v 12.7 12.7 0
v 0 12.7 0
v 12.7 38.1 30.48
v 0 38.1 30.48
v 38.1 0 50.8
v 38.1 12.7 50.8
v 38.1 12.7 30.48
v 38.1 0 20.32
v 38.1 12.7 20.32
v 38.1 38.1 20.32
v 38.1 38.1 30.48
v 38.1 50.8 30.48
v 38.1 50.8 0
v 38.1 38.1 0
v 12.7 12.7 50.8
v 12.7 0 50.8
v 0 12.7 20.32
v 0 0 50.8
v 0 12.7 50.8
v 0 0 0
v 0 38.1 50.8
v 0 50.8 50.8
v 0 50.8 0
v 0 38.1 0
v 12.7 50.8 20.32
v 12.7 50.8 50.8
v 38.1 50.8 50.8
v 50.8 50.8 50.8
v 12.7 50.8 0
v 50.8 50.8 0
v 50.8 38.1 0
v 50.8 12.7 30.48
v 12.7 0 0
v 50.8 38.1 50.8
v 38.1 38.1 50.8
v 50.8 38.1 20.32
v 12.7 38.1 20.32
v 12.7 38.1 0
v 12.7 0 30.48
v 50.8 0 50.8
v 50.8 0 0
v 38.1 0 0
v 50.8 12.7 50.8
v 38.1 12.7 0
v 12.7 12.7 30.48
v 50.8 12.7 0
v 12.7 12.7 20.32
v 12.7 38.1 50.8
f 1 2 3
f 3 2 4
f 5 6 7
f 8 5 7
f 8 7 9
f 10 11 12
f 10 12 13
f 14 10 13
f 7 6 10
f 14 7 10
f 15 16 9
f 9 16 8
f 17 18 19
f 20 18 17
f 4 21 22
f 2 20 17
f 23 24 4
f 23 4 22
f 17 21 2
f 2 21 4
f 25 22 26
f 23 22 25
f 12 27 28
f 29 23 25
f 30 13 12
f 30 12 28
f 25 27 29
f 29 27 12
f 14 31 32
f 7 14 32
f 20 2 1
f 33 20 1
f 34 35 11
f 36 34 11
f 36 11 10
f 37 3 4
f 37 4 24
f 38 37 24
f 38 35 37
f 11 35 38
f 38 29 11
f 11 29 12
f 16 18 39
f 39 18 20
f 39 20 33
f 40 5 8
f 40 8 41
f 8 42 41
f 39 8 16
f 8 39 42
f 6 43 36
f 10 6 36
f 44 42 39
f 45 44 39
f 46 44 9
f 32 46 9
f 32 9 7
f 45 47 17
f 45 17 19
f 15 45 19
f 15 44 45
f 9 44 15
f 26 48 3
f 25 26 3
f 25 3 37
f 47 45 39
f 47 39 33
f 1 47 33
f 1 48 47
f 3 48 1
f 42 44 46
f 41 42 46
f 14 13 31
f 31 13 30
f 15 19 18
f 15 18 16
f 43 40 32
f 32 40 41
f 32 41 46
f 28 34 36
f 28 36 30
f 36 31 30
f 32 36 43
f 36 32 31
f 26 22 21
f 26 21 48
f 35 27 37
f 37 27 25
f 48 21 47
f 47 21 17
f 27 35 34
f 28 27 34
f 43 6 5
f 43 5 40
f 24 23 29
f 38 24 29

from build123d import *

# Parameters (mm, degrees)
F0_W     = 50.8
F0_H     = 50.8
F0_W_2   = 25.4
F0_H_2   = 25.4
F1_DEPTH = 50.8
F3_DEPTH = 12.7
F5_DEPTH = 12.7
F7_DEPTH = 12.7
F9_DEPTH = 12.7


with BuildPart() as f1:
    # F0 (on Top) → F1 (new body)
    with BuildSketch(Plane.XY):
        with Locations((25.4, 25.4)):
            Rectangle(F0_W, F0_H)
        with Locations((25.4, 25.4)):
            Rectangle(F0_W_2, F0_H_2, mode=Mode.SUBTRACT)
    extrude(amount=F1_DEPTH)

    # F2 (on face) → F3 (cut)
    with BuildSketch(Plane.YZ.offset(50.8)):
        Polygon((12.7, 30.48), (12.7, 0), (38.1, 0), align=None)
        Polygon((38.1, 20.32), (38.1, 50.8), (12.7, 50.8), align=None)
    extrude(amount=-F3_DEPTH, mode=Mode.SUBTRACT)

    # F4 (on face) → F5 (cut)
    with BuildSketch(Plane.XZ):
        Polygon((12.7, 30.48), (12.7, 0), (38.1, 0), align=None)
        Polygon((38.1, 20.32), (38.1, 50.8), (12.7, 50.8), align=None)
    extrude(amount=-F5_DEPTH, mode=Mode.SUBTRACT)

    # F6 (on face) → F7 (cut)
    with BuildSketch(Plane(origin=(0, 0, 0), x_dir=(0, -1, 0), z_dir=(-1, 0, 0))):
        Polygon((-38.1, 30.48), (-38.1, 0), (-12.7, 0), align=None)
        Polygon((-12.7, 20.32), (-12.7, 50.8), (-38.1, 50.8), align=None)
    extrude(amount=-F7_DEPTH, mode=Mode.SUBTRACT)

    # F8 (on face) → F9 (cut)
    with BuildSketch(Plane(origin=(0, 50.8, 0), x_dir=(-1, 0, 0), z_dir=(0, 1, 0))):
        Polygon((-38.1, 30.48), (-38.1, 0), (-12.7, 0), align=None)
        Polygon((-12.7, 20.32), (-12.7, 50.8), (-38.1, 50.8), align=None)
    extrude(amount=-F9_DEPTH, mode=Mode.SUBTRACT)


solid = f1.part
